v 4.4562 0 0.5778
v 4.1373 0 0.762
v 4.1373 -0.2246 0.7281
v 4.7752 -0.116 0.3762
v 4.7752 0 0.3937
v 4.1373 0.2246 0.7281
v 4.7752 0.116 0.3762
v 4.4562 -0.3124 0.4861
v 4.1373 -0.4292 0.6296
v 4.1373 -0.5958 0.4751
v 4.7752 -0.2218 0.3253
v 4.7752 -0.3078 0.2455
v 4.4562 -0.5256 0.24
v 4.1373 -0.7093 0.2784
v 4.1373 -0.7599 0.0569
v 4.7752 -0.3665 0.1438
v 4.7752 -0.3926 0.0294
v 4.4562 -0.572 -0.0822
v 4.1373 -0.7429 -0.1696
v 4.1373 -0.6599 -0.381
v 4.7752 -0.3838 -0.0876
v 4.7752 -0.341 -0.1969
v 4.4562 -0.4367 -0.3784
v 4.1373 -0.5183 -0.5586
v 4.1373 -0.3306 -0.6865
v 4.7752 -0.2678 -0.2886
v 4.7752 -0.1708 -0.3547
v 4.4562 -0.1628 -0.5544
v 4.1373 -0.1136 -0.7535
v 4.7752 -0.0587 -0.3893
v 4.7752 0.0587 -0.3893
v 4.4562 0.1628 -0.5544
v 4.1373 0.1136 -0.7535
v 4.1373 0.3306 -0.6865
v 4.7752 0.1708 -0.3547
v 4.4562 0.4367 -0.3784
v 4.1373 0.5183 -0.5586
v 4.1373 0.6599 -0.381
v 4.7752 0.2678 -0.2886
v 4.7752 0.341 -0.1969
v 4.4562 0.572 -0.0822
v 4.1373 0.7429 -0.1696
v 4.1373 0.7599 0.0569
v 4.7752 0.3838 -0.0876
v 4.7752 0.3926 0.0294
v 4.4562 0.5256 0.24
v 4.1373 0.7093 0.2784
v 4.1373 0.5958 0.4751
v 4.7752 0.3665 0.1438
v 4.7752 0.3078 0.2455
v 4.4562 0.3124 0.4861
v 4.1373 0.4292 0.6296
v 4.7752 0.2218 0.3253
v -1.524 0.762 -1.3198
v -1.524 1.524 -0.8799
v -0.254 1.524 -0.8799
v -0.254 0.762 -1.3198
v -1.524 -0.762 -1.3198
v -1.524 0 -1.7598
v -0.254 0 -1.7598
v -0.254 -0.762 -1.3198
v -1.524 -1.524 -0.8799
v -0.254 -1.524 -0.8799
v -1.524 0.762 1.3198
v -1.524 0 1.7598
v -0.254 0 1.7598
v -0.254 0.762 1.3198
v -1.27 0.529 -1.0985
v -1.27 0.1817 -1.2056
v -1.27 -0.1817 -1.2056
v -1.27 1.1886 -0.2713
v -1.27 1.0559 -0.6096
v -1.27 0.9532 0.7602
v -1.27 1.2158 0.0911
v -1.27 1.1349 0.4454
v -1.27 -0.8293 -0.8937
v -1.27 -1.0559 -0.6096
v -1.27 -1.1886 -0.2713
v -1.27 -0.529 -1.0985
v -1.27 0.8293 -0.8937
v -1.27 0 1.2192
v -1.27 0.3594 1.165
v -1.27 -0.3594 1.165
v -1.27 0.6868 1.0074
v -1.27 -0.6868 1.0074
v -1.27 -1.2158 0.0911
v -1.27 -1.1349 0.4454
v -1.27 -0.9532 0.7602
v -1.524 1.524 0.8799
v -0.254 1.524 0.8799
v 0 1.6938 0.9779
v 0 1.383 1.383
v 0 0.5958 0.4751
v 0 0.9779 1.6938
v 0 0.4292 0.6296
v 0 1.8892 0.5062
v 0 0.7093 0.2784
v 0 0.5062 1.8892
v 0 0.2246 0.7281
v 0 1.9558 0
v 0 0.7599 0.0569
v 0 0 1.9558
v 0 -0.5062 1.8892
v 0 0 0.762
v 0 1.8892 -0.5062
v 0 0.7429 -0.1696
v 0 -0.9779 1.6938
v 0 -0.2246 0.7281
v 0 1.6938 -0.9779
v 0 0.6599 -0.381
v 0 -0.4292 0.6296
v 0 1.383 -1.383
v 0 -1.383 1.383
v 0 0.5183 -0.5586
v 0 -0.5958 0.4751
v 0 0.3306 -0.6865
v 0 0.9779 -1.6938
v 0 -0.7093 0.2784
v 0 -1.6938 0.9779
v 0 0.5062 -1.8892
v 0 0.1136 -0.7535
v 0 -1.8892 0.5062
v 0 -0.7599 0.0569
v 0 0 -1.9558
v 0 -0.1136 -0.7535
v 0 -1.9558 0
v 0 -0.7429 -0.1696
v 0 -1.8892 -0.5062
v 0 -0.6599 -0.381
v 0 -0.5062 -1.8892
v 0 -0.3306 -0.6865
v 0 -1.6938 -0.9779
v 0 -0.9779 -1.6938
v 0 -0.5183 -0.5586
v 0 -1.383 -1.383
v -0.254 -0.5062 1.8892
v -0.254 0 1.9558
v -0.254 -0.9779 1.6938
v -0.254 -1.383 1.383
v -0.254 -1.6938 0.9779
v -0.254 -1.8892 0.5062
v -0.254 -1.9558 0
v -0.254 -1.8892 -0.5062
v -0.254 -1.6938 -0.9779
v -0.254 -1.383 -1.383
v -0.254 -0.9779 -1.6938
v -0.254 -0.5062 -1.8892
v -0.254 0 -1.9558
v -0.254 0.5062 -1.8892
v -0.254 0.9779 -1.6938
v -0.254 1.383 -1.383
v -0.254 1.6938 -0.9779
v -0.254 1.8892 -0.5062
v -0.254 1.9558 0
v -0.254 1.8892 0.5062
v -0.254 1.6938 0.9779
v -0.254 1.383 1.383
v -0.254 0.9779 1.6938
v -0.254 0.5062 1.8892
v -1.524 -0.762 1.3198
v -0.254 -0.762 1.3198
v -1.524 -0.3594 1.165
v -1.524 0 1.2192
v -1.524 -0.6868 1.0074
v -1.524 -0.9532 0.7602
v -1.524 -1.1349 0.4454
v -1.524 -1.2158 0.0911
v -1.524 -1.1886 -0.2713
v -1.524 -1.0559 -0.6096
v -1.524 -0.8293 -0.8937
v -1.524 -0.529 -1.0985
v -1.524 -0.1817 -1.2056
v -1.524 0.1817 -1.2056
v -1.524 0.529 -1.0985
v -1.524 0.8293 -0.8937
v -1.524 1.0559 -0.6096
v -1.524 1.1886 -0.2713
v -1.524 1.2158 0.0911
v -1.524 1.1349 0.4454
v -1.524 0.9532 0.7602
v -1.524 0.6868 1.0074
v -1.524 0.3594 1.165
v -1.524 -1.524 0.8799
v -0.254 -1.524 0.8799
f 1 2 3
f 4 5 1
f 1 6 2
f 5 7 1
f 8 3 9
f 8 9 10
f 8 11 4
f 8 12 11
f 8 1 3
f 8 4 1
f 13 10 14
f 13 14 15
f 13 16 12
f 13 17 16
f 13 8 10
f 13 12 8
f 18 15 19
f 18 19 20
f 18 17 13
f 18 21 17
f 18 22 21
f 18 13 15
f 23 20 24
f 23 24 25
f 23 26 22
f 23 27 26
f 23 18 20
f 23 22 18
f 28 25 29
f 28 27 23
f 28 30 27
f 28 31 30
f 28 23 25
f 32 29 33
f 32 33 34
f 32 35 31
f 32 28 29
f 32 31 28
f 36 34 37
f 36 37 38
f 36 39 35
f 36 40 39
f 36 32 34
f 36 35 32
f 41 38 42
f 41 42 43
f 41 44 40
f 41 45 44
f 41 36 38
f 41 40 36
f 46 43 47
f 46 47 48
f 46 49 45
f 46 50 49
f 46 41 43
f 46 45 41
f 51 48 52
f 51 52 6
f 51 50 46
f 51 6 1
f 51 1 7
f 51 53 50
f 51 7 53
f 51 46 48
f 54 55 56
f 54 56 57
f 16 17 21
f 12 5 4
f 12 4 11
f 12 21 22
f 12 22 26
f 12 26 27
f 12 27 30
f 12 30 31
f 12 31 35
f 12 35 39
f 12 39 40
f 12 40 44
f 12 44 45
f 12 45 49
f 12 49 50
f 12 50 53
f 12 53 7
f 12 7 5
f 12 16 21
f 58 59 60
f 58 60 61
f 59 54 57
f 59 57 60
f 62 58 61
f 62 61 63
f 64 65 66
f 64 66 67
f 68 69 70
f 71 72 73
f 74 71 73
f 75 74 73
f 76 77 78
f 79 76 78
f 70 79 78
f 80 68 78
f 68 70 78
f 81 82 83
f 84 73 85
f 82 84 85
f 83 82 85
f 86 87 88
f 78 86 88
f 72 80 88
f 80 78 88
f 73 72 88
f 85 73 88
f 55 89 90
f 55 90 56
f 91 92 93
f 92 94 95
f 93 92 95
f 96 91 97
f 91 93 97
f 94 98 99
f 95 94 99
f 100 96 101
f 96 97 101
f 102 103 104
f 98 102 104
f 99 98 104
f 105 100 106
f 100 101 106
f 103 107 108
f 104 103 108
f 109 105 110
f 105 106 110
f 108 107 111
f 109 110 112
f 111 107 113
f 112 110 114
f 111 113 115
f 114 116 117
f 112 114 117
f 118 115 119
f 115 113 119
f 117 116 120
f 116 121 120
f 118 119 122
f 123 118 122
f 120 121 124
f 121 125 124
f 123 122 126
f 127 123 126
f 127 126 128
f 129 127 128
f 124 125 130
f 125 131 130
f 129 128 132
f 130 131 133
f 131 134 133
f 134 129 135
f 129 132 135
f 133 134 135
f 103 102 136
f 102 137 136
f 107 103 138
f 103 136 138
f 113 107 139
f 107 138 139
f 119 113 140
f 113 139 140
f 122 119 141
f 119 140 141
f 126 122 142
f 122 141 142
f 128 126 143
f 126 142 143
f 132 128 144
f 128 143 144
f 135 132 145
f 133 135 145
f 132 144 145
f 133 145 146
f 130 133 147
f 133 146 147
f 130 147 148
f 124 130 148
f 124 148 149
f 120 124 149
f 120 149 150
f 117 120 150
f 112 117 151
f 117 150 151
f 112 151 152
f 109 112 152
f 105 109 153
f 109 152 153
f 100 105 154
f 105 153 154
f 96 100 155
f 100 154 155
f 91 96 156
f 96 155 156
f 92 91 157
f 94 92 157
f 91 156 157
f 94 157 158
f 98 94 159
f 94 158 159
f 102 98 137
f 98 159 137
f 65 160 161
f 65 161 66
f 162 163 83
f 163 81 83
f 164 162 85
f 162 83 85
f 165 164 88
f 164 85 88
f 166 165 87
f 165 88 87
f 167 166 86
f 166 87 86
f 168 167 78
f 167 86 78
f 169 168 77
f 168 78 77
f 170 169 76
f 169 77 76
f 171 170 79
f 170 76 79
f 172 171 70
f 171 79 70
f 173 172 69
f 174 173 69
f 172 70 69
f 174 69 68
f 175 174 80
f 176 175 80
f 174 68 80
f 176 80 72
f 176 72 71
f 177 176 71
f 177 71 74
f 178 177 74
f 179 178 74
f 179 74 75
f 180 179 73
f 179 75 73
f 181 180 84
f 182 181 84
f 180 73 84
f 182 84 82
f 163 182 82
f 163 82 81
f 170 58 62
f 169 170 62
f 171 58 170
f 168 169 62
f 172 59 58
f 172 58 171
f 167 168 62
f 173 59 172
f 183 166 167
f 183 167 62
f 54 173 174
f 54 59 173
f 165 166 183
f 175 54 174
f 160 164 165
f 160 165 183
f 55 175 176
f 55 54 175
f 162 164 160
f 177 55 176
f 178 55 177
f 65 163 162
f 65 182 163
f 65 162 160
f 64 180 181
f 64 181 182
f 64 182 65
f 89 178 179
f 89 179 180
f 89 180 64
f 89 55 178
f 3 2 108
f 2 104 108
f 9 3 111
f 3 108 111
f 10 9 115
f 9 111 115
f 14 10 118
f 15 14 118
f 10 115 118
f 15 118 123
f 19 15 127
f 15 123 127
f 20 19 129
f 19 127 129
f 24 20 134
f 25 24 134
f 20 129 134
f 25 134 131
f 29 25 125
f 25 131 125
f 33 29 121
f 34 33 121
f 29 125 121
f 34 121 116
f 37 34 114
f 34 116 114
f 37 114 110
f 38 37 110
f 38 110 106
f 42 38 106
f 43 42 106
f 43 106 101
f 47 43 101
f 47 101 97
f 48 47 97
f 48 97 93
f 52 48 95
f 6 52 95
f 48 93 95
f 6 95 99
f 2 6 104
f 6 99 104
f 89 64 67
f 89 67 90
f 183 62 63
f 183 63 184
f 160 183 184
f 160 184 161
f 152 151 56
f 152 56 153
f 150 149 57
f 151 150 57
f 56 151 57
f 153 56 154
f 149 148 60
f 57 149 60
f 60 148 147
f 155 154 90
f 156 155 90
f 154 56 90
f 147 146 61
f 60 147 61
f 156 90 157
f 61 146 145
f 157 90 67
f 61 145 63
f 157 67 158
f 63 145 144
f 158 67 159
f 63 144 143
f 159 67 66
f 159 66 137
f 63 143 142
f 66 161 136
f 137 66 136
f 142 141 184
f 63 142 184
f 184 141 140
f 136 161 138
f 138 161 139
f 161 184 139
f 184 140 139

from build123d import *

# Parameters (mm, degrees)
EXTRUDE1_REACH = 8.88


with BuildPart() as part:
    # Sketch1 → base-Revolve (revolve)
    with BuildSketch(Plane.XY, mode=Mode.PRIVATE) as base_revolve_sk:
        Polygon((0, 1.9558), (-0.254, 1.9558), (-0.254, 1.524), (-1.524, 1.524), (-1.524, 1.2192), (-1.27, 1.2192), (-1.27, 0), (0, 0), (4.7752, 0), (4.7752, 0.762), (0, 0.762), align=None)
    revolve(base_revolve_sk.sketch.rotate(Axis((0, 0, 0), (1, 0, 0)), 90), axis=Axis((0, 0, 0), (1, 0, 0)))

    # Sketch15 → Extrude1 (add, up to next)
    with BuildSketch(Plane.ZY.offset(1.524), mode=Mode.PRIVATE) as extrude1_sk1:
        with BuildLine():
            ThreePointArc((-1.319822717, -0.761999997), (-1.524, 6e-09), (-1.319822711, 0.762000008))
            Line((-1.319822711, 0.762000008), (-1.75976362, 0))
            Line((-1.75976362, 0), (-1.319822717, -0.761999997))
        make_face()
    extrude1_tool1 = extrude(extrude1_sk1.sketch, amount=-EXTRUDE1_REACH, mode=Mode.PRIVATE) - part.part
    # Sketch15 → Extrude1 (add, up to next)
    with BuildSketch(Plane.ZY.offset(1.524), mode=Mode.PRIVATE) as extrude1_sk2:
        with BuildLine():
            ThreePointArc((-1.319822711, 0.762000008), (-0.761999998, 1.319822717), (-5e-09, 1.524))
            Line((-5e-09, 1.524), (-0.87988181, 1.524))
            Line((-0.87988181, 1.524), (-1.319822711, 0.762000008))
        make_face()
    extrude1_tool2 = extrude(extrude1_sk2.sketch, amount=-EXTRUDE1_REACH, mode=Mode.PRIVATE) - part.part
    # Sketch15 → Extrude1 (add, up to next)
    with BuildSketch(Plane.ZY.offset(1.524), mode=Mode.PRIVATE) as extrude1_sk3:
        with BuildLine():
            ThreePointArc((-5e-09, 1.524), (0.761999979, 1.319822727), (1.319822694, 0.762000038))
            Line((1.319822694, 0.762000038), (0.87988181, 1.524))
            Line((0.87988181, 1.524), (-5e-09, 1.524))
        make_face()
    extrude1_tool3 = extrude(extrude1_sk3.sketch, amount=-EXTRUDE1_REACH, mode=Mode.PRIVATE) - part.part
    # Sketch15 → Extrude1 (add, up to next)
    with BuildSketch(Plane.ZY.offset(1.524), mode=Mode.PRIVATE) as extrude1_sk4:
        with BuildLine():
            Line((1.319822721, -0.76199999), (1.75976362, 0))
            Line((1.75976362, 0), (1.319822694, 0.762000038))
            ThreePointArc((1.319822694, 0.762000038), (1.472070954, 0.394440246), (1.524, 0))
            ThreePointArc((1.524, 0), (1.472070961, -0.394440219), (1.319822721, -0.76199999))
        make_face()
    extrude1_tool4 = extrude(extrude1_sk4.sketch, amount=-EXTRUDE1_REACH, mode=Mode.PRIVATE) - part.part
    # Sketch15 → Extrude1 (add, up to next)
    with BuildSketch(Plane.ZY.offset(1.524), mode=Mode.PRIVATE) as extrude1_sk5:
        with BuildLine():
            Line((0.87988181, -1.524), (1.319822721, -0.76199999))
            ThreePointArc((1.319822721, -0.76199999), (0.762000003, -1.319822714), (-5e-09, -1.524))
            Line((-5e-09, -1.524), (0.87988181, -1.524))
        make_face()
    extrude1_tool5 = extrude(extrude1_sk5.sketch, amount=-EXTRUDE1_REACH, mode=Mode.PRIVATE) - part.part
    # Sketch15 → Extrude1 (add, up to next)
    with BuildSketch(Plane.ZY.offset(1.524), mode=Mode.PRIVATE) as extrude1_sk6:
        with BuildLine():
            Line((-0.87988181, -1.524), (-5e-09, -1.524))
            ThreePointArc((-5e-09, -1.524), (-0.762000004, -1.319822713), (-1.319822717, -0.761999997))
            Line((-1.319822717, -0.761999997), (-0.87988181, -1.524))
        make_face()
    extrude1_tool6 = extrude(extrude1_sk6.sketch, amount=-EXTRUDE1_REACH, mode=Mode.PRIVATE) - part.part
    add(extrude1_tool1.solids().sort_by_distance((-1.524, 0, -1.57515))[0])
    add(extrude1_tool2.solids().sort_by_distance((-1.524, 1.36412, -0.787575))[0])
    add(extrude1_tool3.solids().sort_by_distance((-1.524, 1.36412, 0.787575))[0])
    add(extrude1_tool4.solids().sort_by_distance((-1.524, 0, 1.57515))[0])
    add(extrude1_tool5.solids().sort_by_distance((-1.524, -1.36412, 0.787575))[0])
    add(extrude1_tool6.solids().sort_by_distance((-1.524, -1.36412, -0.787575))[0])

    # Sketch8 → point_Cut-Revolve1 (revolve, cut)
    with BuildSketch(Plane.XY, mode=Mode.PRIVATE) as point_cut_revolve1_sk:
        Polygon((4.7752, 0), (5.2832, 0), (5.2832, 1.27), (4.137285688, 1.27), (4.137285688, 0.762), (4.7752, 0.3937), align=None)
    revolve(point_cut_revolve1_sk.sketch.rotate(Axis((0, 0, 0), (1, 0, 0)), 90), axis=Axis((0, 0, 0), (1, 0, 0)), mode=Mode.SUBTRACT)


solid = part.part
